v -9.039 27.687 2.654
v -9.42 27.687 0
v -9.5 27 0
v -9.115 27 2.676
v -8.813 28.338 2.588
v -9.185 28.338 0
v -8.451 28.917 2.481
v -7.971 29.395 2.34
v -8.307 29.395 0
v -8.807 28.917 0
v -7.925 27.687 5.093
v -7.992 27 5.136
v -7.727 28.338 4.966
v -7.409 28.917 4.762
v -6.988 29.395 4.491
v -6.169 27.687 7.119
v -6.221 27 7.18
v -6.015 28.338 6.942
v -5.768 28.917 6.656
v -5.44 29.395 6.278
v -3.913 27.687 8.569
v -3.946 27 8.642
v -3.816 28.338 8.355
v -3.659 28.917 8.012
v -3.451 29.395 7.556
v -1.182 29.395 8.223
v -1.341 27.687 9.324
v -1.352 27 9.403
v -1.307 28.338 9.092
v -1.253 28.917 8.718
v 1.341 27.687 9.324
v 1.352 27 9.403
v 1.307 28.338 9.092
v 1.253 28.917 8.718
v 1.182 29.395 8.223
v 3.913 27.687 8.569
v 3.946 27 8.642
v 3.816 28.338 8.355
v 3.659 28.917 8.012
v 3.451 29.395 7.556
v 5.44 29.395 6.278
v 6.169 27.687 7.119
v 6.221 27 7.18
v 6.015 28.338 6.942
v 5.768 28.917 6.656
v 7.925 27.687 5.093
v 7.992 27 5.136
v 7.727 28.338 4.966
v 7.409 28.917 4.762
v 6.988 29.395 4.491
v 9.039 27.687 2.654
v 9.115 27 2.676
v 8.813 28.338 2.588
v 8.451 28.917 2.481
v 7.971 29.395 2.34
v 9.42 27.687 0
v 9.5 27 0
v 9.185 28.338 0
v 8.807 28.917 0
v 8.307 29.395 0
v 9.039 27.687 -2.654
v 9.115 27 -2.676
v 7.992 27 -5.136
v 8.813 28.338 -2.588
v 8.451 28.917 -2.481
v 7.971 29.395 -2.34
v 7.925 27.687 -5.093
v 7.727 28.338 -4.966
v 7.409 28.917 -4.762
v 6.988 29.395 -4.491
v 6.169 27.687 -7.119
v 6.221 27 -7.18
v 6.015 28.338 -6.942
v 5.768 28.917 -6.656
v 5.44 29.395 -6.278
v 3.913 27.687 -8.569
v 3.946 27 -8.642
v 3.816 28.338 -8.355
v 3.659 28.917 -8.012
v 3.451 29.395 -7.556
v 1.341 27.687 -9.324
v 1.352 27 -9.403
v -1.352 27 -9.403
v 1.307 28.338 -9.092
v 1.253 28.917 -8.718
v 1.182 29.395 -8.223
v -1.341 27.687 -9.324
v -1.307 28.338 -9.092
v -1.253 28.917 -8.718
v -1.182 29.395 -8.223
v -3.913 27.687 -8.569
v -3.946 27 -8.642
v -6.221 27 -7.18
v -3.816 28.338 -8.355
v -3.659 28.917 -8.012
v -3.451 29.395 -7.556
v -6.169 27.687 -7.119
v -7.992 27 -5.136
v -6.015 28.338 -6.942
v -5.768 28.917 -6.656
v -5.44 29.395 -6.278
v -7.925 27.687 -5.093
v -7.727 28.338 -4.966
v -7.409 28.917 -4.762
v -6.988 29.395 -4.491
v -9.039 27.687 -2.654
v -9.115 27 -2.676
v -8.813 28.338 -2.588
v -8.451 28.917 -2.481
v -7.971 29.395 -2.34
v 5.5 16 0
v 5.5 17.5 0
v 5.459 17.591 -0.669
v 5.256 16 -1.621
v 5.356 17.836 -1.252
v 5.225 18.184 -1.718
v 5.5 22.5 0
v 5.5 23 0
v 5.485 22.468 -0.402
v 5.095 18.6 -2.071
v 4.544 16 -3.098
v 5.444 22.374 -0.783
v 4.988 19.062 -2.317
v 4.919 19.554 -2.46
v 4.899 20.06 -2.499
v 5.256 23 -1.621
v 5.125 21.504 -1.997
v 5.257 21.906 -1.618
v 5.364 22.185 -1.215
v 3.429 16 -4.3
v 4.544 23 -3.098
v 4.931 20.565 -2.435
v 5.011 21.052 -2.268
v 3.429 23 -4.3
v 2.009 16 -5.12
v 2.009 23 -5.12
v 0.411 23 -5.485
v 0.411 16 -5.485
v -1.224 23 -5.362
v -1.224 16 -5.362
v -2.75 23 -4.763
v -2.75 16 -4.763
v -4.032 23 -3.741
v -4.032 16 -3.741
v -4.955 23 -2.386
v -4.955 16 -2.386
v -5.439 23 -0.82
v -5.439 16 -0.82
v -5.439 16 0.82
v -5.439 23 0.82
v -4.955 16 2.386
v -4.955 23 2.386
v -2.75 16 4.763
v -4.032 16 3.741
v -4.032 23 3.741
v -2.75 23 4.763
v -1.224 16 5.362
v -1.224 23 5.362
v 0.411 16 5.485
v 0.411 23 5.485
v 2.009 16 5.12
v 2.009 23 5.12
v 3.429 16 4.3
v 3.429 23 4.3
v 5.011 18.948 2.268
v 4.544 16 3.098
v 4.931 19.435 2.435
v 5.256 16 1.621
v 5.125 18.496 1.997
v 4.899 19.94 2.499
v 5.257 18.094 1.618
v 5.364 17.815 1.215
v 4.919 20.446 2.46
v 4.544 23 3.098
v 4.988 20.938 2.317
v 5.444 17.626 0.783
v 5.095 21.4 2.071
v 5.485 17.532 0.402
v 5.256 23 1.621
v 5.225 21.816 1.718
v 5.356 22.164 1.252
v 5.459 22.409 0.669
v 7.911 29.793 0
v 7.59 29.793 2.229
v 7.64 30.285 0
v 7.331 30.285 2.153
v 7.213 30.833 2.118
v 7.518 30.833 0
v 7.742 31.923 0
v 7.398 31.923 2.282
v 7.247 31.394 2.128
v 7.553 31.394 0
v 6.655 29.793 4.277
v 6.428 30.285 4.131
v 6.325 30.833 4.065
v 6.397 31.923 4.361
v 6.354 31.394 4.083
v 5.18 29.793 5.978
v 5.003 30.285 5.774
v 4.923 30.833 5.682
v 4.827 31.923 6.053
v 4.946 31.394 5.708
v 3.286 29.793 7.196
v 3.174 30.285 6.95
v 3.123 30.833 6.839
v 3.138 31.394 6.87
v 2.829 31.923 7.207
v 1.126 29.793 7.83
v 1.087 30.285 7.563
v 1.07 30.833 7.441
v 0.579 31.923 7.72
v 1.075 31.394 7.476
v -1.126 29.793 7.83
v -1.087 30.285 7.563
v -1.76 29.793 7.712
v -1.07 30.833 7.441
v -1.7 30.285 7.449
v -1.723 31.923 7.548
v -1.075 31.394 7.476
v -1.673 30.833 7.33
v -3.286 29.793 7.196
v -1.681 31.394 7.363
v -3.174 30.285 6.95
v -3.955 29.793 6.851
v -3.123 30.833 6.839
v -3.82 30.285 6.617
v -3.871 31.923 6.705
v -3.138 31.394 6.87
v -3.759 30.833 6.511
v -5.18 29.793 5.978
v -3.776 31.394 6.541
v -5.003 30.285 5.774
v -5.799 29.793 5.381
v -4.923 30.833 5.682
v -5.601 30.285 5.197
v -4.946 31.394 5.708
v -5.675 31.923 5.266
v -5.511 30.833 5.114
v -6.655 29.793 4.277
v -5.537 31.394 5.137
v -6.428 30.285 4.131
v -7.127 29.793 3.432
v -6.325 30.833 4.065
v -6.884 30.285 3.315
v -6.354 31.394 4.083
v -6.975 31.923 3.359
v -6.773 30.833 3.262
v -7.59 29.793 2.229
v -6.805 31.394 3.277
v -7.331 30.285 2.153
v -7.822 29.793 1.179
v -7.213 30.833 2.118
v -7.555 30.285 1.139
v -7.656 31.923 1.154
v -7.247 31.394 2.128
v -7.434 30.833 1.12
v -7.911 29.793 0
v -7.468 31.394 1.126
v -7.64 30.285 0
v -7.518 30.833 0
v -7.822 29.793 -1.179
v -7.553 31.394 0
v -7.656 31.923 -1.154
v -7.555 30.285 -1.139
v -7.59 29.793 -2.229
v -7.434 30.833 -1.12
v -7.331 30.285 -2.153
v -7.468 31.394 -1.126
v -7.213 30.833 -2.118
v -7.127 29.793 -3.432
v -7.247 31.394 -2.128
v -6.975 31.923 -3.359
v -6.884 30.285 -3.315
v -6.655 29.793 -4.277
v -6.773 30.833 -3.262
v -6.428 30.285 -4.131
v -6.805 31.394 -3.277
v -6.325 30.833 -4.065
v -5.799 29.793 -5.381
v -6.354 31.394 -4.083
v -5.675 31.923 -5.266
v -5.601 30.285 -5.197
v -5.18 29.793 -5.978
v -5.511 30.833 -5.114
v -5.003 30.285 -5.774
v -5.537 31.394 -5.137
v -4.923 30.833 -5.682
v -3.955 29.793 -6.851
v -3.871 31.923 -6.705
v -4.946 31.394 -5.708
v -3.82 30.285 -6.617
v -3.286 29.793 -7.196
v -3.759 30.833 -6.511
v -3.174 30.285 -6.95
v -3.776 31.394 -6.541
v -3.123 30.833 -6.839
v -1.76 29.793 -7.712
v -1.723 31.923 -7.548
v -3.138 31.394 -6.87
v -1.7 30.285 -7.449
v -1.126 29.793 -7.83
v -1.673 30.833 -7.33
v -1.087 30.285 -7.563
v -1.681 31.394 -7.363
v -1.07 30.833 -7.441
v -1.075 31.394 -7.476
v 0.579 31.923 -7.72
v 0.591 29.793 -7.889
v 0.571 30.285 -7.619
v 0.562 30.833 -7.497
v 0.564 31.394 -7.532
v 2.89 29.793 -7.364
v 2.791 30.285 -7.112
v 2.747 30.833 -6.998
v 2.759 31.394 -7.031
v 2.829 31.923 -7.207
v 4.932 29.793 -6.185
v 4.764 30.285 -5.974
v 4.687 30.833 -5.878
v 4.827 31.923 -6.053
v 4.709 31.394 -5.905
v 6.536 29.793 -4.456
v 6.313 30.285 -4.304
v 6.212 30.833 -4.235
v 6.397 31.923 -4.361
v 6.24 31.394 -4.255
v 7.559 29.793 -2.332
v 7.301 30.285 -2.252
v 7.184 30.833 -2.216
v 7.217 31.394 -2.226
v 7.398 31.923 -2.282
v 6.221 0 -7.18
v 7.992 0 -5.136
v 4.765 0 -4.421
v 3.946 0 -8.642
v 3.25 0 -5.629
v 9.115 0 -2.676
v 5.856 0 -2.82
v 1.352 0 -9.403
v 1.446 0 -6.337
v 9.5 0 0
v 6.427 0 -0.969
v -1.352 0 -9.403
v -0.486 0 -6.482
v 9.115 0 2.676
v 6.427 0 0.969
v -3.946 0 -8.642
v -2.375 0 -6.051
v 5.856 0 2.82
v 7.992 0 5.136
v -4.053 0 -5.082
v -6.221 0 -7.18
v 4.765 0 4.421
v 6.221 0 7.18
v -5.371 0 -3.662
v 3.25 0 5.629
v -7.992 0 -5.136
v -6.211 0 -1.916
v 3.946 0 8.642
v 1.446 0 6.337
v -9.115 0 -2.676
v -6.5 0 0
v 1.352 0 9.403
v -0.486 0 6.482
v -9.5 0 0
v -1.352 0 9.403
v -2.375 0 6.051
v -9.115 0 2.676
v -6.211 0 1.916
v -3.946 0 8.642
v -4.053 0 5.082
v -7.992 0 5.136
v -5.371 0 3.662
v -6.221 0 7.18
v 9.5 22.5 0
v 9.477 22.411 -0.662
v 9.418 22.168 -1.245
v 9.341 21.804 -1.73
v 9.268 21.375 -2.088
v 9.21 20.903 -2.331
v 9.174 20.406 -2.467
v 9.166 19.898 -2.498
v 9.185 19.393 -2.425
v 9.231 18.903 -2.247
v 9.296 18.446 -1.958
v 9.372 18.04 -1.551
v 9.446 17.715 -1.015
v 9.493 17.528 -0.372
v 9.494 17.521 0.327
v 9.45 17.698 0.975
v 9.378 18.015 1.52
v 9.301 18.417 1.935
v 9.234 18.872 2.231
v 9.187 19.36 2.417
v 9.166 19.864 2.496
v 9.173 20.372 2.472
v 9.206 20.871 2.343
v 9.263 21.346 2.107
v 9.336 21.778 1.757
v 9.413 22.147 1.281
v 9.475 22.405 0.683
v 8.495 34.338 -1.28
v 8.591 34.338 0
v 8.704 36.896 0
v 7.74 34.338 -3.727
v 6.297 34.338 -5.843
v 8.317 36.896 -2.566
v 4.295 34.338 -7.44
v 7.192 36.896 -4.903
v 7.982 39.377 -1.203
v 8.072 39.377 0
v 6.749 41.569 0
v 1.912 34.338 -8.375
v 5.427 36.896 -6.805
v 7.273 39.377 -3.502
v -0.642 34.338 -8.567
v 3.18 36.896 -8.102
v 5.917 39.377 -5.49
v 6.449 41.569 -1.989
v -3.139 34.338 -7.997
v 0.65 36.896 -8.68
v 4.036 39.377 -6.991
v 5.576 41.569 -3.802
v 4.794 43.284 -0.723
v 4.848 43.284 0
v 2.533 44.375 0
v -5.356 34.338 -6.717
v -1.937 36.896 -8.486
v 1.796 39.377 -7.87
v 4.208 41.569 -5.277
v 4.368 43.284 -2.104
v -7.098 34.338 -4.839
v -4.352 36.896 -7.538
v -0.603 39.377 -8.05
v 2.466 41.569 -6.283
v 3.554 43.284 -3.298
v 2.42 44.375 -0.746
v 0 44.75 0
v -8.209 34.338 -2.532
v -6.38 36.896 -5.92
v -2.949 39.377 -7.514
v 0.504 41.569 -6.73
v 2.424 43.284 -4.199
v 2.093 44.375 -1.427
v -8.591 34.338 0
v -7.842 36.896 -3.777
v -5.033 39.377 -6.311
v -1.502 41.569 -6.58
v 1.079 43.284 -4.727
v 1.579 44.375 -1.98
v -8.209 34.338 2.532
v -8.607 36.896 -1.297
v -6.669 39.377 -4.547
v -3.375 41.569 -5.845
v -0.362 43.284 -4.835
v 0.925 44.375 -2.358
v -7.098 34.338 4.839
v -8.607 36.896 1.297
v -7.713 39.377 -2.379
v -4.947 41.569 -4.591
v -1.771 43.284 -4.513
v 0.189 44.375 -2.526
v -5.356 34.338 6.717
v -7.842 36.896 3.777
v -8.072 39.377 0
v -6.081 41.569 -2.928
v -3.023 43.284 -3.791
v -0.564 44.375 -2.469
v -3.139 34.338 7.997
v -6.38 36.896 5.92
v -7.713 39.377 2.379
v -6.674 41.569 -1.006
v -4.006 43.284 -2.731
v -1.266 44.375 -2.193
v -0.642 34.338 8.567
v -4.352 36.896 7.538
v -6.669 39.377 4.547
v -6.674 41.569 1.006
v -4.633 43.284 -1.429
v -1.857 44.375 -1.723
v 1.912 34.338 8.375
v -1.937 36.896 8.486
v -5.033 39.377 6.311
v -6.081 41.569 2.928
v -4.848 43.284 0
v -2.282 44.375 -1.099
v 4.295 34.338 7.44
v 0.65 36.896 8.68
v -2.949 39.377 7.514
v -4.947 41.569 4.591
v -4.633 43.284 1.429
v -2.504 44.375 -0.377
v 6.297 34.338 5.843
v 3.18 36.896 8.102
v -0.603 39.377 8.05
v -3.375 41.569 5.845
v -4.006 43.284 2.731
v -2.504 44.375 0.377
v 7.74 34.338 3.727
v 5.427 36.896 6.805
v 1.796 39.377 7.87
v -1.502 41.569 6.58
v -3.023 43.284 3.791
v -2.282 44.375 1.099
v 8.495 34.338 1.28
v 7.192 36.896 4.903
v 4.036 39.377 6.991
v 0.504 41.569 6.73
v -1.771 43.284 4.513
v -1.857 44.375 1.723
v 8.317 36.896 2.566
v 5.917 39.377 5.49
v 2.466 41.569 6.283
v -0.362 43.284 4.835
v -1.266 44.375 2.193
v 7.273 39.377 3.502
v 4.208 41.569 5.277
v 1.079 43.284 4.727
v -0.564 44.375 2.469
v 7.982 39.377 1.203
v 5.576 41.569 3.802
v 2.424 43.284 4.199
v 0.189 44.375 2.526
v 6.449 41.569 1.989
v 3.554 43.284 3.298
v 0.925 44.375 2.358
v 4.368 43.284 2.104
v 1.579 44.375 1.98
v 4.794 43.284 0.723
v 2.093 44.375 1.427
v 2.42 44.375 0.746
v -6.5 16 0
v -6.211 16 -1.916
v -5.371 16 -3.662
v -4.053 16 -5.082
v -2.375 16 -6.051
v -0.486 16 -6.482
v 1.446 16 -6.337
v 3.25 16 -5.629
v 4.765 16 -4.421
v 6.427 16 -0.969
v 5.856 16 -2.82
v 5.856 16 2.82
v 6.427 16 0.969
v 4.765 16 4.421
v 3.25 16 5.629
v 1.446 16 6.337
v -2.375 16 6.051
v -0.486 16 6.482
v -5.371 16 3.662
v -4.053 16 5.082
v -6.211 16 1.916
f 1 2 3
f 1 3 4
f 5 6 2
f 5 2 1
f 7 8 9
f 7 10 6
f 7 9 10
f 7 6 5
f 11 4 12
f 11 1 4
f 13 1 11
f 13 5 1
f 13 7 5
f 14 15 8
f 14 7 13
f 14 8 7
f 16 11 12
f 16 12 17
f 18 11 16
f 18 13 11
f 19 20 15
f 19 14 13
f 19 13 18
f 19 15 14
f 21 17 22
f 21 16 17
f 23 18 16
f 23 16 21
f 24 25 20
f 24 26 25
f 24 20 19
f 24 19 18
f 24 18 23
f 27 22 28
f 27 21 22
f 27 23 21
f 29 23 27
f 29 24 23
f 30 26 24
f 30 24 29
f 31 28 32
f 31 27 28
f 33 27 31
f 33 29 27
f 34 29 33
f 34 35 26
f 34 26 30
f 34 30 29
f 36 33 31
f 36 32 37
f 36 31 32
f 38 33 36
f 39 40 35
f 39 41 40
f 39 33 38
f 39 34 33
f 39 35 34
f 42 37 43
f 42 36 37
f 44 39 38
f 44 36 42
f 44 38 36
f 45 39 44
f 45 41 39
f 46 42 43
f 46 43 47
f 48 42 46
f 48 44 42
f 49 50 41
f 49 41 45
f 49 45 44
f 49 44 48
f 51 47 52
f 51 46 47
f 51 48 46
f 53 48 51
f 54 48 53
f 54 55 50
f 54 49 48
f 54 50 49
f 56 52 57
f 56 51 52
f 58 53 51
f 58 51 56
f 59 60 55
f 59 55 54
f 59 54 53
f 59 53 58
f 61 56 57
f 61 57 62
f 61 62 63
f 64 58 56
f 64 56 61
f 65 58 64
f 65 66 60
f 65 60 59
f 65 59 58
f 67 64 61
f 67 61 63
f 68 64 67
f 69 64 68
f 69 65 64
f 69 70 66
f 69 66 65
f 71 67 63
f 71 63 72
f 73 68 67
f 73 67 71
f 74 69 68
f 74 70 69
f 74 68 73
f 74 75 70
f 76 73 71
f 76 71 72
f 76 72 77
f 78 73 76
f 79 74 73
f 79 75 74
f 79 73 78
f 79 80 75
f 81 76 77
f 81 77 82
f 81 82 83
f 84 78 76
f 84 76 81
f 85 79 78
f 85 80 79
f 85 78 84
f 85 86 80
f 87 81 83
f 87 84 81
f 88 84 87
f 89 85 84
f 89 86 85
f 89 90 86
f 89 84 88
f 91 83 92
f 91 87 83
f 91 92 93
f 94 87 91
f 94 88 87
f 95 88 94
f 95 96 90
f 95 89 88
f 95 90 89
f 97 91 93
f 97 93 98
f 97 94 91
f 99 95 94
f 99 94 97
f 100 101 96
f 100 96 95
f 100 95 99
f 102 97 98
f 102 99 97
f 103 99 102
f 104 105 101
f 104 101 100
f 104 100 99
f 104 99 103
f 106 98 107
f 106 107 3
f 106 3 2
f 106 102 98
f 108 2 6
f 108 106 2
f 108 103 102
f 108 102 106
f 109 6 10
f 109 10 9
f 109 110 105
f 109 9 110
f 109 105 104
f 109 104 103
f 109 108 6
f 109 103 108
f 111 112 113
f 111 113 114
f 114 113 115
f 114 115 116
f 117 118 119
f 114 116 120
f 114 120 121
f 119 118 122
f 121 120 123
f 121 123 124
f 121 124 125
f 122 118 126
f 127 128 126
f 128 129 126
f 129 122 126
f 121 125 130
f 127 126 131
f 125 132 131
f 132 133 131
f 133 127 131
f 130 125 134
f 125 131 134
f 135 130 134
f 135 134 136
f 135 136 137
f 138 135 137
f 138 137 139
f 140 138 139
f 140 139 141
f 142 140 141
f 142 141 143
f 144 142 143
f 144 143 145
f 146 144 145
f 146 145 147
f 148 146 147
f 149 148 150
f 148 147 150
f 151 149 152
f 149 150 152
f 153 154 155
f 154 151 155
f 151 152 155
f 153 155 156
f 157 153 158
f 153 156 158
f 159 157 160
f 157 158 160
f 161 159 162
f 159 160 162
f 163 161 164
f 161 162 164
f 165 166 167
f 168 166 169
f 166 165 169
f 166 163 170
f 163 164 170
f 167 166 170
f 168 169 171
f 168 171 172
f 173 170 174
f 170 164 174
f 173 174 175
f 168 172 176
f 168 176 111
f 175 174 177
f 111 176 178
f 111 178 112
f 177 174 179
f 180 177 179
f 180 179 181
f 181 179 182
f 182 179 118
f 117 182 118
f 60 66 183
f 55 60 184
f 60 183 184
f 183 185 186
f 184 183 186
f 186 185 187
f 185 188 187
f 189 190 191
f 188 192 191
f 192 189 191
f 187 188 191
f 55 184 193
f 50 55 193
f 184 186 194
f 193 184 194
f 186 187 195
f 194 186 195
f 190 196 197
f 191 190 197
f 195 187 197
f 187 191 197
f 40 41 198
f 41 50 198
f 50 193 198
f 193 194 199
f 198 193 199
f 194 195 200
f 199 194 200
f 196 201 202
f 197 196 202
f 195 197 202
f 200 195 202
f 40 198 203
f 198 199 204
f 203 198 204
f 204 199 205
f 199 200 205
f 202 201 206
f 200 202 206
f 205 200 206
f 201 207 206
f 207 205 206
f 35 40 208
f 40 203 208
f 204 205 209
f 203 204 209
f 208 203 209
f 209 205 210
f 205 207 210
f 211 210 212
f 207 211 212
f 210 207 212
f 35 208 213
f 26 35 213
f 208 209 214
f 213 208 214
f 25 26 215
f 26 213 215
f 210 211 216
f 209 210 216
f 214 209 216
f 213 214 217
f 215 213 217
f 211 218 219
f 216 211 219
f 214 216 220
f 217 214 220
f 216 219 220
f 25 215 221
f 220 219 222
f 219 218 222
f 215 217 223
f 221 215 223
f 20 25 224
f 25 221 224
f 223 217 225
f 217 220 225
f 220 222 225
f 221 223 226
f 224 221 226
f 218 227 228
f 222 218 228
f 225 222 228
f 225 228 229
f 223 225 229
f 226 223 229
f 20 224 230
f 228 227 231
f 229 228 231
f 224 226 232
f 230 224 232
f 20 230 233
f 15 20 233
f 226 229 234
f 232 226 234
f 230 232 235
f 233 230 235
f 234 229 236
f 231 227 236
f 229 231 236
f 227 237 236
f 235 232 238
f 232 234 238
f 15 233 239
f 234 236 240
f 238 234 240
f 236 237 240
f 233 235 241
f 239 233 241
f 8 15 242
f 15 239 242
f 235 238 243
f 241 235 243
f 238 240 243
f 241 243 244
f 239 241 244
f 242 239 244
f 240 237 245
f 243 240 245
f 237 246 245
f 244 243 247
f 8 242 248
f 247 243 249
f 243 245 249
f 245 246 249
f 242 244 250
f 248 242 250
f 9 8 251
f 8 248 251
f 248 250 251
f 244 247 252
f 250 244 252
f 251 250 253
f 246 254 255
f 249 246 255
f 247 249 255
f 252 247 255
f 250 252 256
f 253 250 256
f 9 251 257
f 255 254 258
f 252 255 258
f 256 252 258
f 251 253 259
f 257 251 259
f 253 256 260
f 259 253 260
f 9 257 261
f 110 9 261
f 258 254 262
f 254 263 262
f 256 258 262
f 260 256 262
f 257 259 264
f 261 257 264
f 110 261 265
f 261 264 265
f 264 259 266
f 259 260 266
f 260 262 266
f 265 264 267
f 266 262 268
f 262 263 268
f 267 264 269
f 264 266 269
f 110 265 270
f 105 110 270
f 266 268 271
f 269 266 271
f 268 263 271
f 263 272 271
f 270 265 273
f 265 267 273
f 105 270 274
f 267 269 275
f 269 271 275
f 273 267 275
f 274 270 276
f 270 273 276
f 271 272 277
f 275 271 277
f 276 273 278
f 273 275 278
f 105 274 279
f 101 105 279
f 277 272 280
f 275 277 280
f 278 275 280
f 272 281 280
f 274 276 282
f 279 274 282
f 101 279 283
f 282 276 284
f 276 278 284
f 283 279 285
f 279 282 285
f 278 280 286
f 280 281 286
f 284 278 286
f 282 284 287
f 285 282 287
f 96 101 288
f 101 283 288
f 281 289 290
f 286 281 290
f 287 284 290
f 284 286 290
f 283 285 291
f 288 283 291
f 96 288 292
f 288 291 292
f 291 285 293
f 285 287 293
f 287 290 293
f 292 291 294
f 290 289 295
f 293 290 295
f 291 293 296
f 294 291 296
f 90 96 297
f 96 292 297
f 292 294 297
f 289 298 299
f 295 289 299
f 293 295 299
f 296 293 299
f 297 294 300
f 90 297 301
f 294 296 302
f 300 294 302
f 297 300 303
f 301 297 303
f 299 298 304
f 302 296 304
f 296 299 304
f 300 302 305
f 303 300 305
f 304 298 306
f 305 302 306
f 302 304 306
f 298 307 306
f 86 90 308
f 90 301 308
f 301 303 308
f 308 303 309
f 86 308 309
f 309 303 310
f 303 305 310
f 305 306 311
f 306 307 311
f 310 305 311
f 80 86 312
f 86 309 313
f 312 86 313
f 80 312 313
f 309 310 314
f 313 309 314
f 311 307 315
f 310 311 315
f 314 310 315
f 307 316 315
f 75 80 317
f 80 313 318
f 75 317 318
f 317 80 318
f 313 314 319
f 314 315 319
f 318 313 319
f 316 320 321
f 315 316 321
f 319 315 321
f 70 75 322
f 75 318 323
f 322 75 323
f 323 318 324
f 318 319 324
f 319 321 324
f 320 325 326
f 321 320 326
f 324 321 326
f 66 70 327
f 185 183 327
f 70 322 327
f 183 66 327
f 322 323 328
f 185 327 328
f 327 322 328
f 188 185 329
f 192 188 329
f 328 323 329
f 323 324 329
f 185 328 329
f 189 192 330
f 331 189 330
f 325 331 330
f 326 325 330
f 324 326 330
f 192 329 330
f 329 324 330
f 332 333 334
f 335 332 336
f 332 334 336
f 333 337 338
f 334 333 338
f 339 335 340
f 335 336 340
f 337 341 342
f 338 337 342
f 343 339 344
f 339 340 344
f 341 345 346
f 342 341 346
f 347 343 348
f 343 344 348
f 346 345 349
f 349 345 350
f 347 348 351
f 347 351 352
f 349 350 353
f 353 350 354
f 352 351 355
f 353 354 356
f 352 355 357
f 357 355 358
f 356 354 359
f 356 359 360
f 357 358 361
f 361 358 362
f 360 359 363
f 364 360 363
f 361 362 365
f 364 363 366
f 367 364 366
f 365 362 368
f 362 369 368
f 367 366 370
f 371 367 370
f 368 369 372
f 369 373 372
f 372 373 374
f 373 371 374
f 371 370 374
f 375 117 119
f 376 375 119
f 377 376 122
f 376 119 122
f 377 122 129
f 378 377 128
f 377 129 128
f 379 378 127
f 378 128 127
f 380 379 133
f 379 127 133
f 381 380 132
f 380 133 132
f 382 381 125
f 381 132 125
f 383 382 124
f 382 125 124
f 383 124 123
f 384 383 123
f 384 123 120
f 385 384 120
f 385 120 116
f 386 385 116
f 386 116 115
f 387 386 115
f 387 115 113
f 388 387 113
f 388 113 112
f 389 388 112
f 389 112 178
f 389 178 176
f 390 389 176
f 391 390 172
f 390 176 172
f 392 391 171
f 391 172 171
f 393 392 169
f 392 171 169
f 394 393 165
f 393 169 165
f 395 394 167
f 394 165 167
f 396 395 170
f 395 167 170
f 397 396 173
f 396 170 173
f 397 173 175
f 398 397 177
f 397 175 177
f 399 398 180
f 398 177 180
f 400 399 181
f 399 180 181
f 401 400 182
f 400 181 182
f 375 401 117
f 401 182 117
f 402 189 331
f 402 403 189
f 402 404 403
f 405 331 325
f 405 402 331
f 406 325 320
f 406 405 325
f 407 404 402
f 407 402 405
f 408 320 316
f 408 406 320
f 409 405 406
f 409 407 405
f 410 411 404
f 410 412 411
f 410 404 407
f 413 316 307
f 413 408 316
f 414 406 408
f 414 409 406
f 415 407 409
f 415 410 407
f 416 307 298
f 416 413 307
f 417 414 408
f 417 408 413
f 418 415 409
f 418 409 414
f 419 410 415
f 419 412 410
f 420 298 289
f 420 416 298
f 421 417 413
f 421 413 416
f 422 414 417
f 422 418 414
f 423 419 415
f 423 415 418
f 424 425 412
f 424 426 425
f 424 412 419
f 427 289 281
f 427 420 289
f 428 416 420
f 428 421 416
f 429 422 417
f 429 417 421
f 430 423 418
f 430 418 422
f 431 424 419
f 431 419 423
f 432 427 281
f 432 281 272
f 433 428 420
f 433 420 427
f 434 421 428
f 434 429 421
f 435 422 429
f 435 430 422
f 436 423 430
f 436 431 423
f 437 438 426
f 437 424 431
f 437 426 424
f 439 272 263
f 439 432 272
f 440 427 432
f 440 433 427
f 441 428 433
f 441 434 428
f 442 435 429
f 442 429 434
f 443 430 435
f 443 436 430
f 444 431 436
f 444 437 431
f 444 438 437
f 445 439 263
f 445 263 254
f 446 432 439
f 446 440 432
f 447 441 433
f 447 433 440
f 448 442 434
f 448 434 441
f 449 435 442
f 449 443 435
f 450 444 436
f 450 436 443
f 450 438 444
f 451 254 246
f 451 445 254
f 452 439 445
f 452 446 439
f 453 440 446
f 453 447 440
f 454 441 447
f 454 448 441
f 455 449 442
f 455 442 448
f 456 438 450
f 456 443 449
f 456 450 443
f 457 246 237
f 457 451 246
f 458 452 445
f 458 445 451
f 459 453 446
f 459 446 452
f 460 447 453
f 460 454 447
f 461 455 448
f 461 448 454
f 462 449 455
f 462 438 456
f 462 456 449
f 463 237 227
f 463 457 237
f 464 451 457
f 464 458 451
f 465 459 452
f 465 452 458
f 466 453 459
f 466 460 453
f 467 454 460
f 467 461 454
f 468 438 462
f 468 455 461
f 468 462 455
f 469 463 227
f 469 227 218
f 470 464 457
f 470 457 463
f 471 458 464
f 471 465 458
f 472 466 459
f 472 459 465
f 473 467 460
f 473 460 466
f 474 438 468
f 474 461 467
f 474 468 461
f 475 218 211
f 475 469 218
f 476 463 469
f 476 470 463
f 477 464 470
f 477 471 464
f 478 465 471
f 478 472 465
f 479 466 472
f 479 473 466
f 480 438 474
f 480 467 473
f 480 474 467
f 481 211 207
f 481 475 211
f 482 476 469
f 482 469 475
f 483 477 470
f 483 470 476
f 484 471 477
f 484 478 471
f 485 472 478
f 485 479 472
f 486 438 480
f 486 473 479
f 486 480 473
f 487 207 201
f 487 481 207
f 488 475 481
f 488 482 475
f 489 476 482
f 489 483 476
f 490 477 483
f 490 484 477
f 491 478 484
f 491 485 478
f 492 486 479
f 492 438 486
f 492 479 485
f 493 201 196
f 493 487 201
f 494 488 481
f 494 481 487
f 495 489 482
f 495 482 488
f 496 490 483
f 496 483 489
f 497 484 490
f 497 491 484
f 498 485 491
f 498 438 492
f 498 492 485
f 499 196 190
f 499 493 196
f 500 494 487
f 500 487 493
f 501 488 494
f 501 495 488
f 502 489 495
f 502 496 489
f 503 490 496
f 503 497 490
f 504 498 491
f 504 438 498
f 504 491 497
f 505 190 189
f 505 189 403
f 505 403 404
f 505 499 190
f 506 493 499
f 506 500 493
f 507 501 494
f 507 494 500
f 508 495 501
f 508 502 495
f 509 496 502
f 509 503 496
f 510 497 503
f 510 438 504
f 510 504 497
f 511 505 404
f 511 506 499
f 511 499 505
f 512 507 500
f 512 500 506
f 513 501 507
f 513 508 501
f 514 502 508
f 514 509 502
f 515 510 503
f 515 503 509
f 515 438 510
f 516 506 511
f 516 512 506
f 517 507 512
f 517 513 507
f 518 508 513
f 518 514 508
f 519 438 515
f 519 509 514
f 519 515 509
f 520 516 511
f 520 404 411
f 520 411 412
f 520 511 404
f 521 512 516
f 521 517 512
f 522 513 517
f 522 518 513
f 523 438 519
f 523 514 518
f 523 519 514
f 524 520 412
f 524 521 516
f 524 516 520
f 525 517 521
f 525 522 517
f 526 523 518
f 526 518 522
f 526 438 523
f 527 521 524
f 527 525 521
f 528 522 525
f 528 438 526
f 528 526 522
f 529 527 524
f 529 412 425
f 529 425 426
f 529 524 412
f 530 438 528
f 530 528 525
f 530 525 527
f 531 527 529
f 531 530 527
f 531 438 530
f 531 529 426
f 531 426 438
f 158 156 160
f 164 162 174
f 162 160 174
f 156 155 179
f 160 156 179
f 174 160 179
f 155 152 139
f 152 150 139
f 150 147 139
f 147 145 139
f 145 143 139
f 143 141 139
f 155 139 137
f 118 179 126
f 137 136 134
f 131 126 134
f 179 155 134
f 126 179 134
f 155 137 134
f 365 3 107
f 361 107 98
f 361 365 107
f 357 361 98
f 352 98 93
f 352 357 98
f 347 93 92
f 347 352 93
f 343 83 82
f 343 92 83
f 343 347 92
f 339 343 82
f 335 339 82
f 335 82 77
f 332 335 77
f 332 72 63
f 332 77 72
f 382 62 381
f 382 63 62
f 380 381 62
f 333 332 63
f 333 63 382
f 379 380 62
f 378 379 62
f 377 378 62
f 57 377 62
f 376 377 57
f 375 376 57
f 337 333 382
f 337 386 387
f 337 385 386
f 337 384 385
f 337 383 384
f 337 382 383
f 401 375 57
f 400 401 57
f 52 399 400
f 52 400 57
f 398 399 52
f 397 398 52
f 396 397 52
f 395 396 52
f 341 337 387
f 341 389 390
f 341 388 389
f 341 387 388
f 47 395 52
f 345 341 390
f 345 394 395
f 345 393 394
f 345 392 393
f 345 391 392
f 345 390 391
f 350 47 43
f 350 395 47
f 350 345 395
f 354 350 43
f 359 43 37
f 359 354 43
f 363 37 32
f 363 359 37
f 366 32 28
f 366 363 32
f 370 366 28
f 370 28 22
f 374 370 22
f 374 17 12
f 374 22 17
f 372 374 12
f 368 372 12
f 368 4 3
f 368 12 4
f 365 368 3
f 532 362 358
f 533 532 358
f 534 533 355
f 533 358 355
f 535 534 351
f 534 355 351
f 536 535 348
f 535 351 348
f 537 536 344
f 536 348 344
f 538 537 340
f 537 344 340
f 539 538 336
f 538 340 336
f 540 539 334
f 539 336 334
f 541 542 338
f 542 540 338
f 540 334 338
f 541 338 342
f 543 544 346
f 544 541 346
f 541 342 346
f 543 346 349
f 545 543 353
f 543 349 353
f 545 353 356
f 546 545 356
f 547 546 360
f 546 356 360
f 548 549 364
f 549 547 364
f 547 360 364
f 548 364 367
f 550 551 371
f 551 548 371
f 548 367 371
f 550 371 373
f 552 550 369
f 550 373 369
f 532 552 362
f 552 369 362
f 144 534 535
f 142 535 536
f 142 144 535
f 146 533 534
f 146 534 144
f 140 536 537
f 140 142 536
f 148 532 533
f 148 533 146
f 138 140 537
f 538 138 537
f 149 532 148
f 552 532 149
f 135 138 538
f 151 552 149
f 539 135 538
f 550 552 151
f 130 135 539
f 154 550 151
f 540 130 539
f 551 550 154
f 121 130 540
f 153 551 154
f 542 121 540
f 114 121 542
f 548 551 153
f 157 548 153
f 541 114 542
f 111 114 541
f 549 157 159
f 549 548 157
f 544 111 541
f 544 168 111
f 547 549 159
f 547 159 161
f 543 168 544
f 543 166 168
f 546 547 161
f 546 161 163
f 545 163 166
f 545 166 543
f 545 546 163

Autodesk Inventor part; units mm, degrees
ref_plane "YZ Plane" through (0, 0, 0) normal (1, 0, 0) x (0, 1, 0)
ref_plane "XZ Plane" through (0, 0, 0) normal (0, 1, 0) x (-1, 0, 0)
ref_plane "XY Plane" through (0, 0, 0) normal (0, 0, 1) x (1, 0, 0)
sketch "Sketch1" plane through (0, 0, 0) normal (0, 1, 0) x (-1, 0, 0)
  circle A0 centre (0, 0) radius 9.5
  circle A1 centre (0, 0) radius 6.5
  dimension "d0" = 13
  dimension "d1" = 3
extrude "Extrusion1" add sketch "Sketch1" along normal blind 30
sketch "Sketch2" plane through (0, 30, 0) normal (0, 1, 0) x (1, 0, 0)
  circle A0 centre (0, 0) radius 6.5
extrude "Extrusion2" add sketch "Sketch2" against normal blind 7
sketch "Sketch3" plane through (0, 30, 0) normal (0, 1, 0) x (1, 0, 0)
  circle A0 centre (0, 0) radius 2.2
  dimension "d6" = 4.4
extrude "Extrusion3" [suppressed]
sketch "Sketch6" plane through (0, 0, 0) normal (0, 0, 1) x (1, 0, 0)
  circle A0 centre (0, 36) radius 8.75
  line L0 (6.5, 23) -> (-6.5, 23) projected
  line L1 (9.5, 30) -> (-9.5, 30) projected
  line L2 (0, 0) -> (0, 49.5814)
  point P0 (0, 27.25)
  point P1 (0, 30)
  point P2 (6.3689, 30)
  point P3 (0, 44.75)
  dimension "d24" = 17.5
  dimension "d25" = 6
  dimension "d26" = 0
revolve "Revolution2" add sketch "Sketch6" angle 360 about axis through (0, 0, 0) along (0, 1, 0) picked at (0.649, 39.7602) contours A0 L1 L2
fillet "Fillet5" radius 3 1 edges at (9.5, 30, 0)
fillet "Fillet6" radius 2 1 edges at (-6.3689, 30, 0)
sketch "Sketch8" plane through (0, 23, 0) normal (0, -1, 0) x (1, 0, 0)
  circle A0 centre (0, 0) radius 5.5
  circle A1 centre (0, 0) radius 6.5 projected
  dimension "d34" = 1
extrude "Extrusion6" add sketch "Sketch8" along normal blind 7
sketch "Sketch7" plane through (0, 0, 0) normal (1, 0, 0) x (0, 1, 0)
  circle A0 centre (20, 0) radius 2.5
  line L0 (27, -9.5) -> (27, 9.5) projected
  point P0 (0, 0)
  dimension "d30" = 5
  dimension "d31" = 7
extrude "Extrusion5" cut sketch "Sketch7" along normal blind 10
sketch "Sketch4" plane through (0, 0, 0) normal (1, 0, 0) x (0, 1, 0)
  circle A0 centre (38, 0) radius 8.75
  line L0 (30, -9.5) -> (30, 9.5) projected
  line L1 (12.9825, 0) -> (37.4487, 0)
  point P0 (0, 0)
  point P1 (36.75, 0)
  point P2 (19.25, 0)
  dimension "d9" = 17.5
  dimension "d11" = 8
properties part number "Ballholder"
